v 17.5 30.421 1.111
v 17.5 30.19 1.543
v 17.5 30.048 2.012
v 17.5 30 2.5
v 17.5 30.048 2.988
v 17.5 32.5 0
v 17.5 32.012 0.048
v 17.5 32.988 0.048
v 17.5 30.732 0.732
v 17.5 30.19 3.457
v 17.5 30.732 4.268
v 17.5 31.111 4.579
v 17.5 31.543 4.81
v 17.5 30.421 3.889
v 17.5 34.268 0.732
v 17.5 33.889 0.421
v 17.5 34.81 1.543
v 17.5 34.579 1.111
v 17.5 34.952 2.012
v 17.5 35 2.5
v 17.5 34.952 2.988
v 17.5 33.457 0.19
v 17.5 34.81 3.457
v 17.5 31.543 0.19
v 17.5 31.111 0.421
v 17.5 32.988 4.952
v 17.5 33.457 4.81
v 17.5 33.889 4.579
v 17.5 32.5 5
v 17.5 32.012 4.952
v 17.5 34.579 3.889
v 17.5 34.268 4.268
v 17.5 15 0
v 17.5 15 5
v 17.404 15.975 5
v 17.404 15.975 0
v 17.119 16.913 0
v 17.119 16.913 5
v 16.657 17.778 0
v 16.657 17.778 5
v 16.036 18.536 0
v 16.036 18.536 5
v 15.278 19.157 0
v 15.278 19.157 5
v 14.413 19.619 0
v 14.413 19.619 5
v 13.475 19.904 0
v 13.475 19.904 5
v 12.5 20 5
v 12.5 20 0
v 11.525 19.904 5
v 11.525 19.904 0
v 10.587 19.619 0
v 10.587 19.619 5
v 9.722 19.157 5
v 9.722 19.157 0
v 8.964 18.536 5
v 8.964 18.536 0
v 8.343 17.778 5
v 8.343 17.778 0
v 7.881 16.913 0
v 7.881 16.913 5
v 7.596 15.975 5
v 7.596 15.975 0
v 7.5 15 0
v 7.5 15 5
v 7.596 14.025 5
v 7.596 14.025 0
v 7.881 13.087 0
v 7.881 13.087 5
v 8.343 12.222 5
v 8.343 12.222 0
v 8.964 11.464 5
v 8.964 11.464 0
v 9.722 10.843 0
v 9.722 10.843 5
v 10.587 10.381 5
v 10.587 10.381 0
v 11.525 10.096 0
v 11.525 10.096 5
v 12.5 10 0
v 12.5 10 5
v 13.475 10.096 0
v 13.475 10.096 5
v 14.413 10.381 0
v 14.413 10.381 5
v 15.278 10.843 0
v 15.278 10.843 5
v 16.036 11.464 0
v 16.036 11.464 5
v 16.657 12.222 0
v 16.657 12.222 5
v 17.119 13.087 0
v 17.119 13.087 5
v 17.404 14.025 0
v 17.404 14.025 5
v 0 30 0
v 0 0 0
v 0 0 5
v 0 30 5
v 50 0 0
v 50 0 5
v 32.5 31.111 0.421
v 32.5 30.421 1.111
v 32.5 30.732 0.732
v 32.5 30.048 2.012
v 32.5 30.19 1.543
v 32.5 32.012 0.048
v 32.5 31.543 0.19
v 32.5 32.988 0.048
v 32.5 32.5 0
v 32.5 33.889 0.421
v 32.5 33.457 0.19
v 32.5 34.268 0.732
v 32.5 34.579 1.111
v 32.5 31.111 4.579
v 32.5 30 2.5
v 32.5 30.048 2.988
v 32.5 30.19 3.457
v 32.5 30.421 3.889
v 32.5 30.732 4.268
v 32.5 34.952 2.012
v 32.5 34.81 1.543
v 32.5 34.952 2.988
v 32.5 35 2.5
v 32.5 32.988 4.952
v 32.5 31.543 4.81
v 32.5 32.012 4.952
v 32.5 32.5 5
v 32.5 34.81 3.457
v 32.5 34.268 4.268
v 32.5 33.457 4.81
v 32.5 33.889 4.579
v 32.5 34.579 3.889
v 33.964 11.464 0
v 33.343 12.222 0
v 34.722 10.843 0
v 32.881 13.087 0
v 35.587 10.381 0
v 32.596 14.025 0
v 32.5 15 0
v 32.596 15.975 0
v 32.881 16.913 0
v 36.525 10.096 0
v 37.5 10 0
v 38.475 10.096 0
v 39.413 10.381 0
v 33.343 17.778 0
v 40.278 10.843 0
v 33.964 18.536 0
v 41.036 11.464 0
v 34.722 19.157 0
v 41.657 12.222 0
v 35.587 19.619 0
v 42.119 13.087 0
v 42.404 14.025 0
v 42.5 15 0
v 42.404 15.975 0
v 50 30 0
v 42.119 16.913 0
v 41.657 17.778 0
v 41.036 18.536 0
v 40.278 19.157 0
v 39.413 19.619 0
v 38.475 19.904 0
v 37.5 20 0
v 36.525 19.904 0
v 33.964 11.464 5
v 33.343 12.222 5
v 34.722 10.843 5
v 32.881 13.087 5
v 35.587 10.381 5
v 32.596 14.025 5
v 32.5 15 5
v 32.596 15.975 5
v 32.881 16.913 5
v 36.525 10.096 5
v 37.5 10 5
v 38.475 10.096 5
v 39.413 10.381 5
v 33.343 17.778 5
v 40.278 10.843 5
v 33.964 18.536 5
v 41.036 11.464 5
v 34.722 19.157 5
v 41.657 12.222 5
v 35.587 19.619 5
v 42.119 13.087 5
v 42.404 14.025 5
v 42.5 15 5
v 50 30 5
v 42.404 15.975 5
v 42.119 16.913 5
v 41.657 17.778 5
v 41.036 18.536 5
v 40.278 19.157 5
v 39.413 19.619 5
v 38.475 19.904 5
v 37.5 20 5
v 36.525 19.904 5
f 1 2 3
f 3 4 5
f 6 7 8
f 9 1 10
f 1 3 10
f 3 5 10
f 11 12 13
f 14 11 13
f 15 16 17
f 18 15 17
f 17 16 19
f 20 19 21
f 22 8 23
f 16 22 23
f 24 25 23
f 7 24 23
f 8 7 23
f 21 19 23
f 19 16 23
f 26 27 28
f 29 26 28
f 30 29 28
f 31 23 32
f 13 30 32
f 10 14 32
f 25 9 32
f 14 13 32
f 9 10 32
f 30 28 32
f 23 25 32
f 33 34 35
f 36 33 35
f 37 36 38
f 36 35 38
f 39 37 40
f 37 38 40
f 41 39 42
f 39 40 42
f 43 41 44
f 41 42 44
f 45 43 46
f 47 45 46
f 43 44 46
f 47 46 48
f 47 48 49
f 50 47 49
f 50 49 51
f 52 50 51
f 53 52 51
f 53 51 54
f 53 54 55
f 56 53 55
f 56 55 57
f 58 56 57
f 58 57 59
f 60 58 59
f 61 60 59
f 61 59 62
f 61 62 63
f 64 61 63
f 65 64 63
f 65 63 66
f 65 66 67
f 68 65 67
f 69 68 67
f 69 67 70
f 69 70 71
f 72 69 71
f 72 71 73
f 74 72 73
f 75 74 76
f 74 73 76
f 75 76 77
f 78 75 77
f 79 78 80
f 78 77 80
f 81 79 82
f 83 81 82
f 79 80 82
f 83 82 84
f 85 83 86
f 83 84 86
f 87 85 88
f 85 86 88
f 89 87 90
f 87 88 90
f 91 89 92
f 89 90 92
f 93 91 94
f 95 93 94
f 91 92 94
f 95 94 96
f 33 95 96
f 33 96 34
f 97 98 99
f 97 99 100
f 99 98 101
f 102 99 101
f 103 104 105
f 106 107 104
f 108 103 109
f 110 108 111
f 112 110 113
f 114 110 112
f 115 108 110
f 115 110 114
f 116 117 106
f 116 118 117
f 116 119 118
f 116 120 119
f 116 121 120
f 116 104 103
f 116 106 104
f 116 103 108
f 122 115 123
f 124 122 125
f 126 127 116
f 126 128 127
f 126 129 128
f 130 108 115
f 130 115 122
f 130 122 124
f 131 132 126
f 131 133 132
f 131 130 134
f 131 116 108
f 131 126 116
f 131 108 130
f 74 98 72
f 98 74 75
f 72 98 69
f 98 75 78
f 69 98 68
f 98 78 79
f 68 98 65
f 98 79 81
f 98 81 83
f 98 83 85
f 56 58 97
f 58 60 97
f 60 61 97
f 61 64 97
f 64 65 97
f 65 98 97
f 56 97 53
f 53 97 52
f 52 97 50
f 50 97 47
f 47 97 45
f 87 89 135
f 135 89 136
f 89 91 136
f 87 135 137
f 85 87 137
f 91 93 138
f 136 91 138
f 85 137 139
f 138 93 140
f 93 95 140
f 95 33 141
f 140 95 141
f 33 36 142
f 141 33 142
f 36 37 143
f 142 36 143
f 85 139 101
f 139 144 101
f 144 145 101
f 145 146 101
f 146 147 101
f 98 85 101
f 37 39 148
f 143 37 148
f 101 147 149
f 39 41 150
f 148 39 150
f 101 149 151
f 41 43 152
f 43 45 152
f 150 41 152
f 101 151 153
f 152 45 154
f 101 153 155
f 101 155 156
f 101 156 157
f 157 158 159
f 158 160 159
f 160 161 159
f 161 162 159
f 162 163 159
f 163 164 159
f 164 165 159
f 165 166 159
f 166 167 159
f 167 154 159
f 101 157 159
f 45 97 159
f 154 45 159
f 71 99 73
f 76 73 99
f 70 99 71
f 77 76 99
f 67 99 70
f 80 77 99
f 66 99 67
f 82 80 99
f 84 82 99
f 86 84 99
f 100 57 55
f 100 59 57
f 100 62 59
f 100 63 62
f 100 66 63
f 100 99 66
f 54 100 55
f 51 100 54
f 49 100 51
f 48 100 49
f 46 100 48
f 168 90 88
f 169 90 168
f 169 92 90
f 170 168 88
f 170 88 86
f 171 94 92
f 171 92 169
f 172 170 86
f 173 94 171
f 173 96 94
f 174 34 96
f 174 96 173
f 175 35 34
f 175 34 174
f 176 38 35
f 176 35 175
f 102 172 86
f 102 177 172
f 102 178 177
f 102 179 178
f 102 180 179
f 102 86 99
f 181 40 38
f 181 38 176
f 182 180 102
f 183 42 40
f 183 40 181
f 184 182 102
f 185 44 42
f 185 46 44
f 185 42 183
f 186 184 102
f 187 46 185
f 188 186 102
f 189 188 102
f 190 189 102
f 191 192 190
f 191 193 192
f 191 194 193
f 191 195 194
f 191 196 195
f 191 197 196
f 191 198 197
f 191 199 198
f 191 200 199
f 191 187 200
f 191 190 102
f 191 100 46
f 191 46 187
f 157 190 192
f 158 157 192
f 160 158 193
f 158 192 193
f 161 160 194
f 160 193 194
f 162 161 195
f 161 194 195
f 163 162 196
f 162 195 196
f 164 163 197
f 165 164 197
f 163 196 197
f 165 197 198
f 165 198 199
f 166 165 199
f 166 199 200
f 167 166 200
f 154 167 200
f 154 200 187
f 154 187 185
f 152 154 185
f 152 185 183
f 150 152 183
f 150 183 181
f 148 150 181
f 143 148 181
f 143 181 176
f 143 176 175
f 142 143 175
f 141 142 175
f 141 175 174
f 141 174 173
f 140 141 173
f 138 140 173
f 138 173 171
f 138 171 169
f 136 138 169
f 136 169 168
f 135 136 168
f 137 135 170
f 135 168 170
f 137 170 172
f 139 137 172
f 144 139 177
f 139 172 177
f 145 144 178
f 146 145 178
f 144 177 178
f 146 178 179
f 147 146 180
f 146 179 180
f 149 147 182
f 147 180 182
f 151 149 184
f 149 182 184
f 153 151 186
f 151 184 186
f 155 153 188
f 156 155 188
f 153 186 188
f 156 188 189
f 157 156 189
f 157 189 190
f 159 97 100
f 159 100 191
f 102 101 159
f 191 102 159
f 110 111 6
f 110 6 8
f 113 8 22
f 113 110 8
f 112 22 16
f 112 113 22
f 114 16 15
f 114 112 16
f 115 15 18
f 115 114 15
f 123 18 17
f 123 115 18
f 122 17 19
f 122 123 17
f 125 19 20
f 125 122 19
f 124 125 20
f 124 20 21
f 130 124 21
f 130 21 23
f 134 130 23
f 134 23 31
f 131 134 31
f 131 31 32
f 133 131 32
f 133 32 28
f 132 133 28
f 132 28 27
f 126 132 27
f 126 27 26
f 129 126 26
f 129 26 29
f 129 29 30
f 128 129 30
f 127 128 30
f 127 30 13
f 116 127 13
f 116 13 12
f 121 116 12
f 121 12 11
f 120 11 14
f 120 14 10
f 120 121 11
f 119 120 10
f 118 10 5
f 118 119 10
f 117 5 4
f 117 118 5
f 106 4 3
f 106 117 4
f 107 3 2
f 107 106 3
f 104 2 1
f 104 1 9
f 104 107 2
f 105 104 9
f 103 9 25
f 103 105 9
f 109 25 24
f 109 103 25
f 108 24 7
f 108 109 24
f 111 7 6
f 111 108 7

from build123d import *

# Parameters (mm, degrees)
ESQUISSE1_W             = 50
ESQUISSE1_H             = 30
BOSS_EXTRU_1_DEPTH      = 5
ESQUISSE2_R             = 5
ENL_V_MAT_EXTRU_1_DEPTH = 6
ESQUISSE3_R             = 2.5
BOSS_EXTRU_2_DEPTH      = 50
ESQUISSE5_W             = 17.5
ESQUISSE5_H             = 5
ENL_V_MAT_EXTRU_6_DEPTH = 6


with BuildPart() as part:
    # Esquisse1 → Boss.-Extru.1 (new body)
    with BuildSketch(Plane.XY):
        with Locations((25, 15)):
            Rectangle(ESQUISSE1_W, ESQUISSE1_H)
    extrude(amount=BOSS_EXTRU_1_DEPTH)

    # Esquisse2 → Enlèv. mat.-Extru.1 (cut, through all)
    with BuildSketch(Plane.XY.offset(5)):
        with Locations((12.5, 15)):
            Circle(ESQUISSE2_R)
        with Locations((37.5, 15)):
            Circle(ESQUISSE2_R)
    extrude(amount=-ENL_V_MAT_EXTRU_1_DEPTH, mode=Mode.SUBTRACT)


with BuildPart() as body_2:
    # Esquisse3 → Boss.-Extru.2 (new body)
    with BuildSketch(Plane(origin=(50, 0, 0), x_dir=(0, 0, -1), z_dir=(1, 0, 0))):
        with Locations((-2.5, 32.5)):
            Circle(ESQUISSE3_R)
    extrude(amount=-BOSS_EXTRU_2_DEPTH)

    # Esquisse5 → Enlèv. mat.-Extru.6 (cut, through all)
    with BuildSketch(Plane.XY.offset(5)):
        with Locations((8.75, 32.5)):
            Rectangle(ESQUISSE5_W, ESQUISSE5_H)
        with Locations((41.25, 32.5)):
            Rectangle(ESQUISSE5_W, ESQUISSE5_H)
    extrude(amount=-ENL_V_MAT_EXTRU_6_DEPTH, mode=Mode.SUBTRACT)


solid = Compound([part.part, body_2.part])
